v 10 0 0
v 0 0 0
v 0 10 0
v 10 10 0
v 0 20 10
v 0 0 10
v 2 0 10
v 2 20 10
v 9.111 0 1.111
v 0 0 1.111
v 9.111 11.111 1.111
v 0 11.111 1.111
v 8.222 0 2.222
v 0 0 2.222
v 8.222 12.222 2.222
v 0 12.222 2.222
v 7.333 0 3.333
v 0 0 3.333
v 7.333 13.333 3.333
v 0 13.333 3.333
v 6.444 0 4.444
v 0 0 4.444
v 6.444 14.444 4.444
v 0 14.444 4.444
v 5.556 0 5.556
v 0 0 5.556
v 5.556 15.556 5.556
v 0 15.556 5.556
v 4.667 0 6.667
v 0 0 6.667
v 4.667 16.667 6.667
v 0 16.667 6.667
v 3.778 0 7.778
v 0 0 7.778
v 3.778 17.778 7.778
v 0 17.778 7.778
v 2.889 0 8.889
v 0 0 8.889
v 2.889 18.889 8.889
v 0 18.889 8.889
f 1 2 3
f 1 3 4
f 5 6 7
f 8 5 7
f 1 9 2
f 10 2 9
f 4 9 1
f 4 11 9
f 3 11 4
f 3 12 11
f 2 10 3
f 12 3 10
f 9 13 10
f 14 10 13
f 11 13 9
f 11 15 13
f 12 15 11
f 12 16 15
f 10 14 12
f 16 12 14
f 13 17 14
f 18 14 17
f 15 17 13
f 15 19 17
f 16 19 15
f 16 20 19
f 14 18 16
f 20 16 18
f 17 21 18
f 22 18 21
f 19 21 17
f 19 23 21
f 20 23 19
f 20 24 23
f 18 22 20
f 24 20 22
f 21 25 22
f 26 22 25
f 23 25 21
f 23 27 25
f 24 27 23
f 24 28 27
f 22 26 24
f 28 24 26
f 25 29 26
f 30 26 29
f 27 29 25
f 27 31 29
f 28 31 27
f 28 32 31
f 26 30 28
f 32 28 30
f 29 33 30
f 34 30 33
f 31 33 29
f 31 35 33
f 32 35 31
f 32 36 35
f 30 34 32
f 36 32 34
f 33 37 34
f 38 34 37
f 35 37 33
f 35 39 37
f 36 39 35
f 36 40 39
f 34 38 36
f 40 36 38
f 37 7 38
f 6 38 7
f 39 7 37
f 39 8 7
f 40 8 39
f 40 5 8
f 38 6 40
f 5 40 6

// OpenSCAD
// A non-uniform scale bends the extrusion walls the way a twist does, so
// OpenSCAD refines the profile and adds slices for it. This is volume-neutral —
// the walls stay ruled surfaces — so the tessellation is the only witness, and
// `tris` is pinned to make it part of the contract.
//
// One object only: several top-level objects would be unioned, and the kernel
// merges the coplanar wall facets back together (596 triangles collapse to 12),
// hiding exactly what this case exists to check.
//
// oracle: tris
linear_extrude(height=10, scale=[0.2,2]) square(10);
